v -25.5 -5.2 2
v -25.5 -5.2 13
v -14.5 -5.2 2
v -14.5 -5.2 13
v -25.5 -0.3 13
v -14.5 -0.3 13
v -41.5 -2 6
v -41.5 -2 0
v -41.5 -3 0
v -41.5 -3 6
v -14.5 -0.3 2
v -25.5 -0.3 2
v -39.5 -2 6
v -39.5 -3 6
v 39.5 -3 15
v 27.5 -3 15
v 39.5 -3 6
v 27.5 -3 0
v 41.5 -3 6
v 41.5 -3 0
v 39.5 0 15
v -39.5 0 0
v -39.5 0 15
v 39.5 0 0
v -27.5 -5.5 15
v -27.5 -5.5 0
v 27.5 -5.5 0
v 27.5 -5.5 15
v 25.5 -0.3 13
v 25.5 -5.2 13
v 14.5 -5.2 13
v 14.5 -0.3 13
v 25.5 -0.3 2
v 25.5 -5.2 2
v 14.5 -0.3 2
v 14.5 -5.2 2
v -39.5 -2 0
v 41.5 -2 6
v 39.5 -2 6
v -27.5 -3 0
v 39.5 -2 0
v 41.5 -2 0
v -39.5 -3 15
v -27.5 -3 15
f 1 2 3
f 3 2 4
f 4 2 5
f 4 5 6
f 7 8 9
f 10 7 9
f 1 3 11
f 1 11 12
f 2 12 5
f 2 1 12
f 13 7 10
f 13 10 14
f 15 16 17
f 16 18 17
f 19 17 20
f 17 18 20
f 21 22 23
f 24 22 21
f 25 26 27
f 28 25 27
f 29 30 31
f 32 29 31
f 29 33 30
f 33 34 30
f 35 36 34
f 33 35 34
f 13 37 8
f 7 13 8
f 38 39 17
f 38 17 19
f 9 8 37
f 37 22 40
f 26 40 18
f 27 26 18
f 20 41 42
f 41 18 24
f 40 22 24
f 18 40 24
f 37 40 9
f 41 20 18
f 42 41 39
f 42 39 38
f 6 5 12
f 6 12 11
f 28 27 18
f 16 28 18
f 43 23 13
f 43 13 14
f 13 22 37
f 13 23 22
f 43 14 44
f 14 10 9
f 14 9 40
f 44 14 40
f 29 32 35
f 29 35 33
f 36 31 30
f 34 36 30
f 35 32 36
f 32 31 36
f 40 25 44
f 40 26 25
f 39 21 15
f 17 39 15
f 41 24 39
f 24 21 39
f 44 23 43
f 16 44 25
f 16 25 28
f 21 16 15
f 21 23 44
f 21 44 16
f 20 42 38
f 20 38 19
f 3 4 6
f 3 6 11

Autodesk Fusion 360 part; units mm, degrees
sketch "Sketch1" plane through (0, 0, 0) normal (0, 0, 1) x (1, 0, 0) in component "Component'"
  line L0 (-39.5, 0) -> (39.5, 0)
  line L1 (-39.5, 0) -> (-39.5, -2)
  line L2 (-39.5, -2) -> (-41.5, -2)
  line L3 (-41.5, -2) -> (-41.5, -3)
  line L4 (0, 0) -> (0, -5.5) construction
  line L5 (39.5, 0) -> (39.5, -2)
  line L6 (39.5, -2) -> (41.5, -2)
  line L7 (41.5, -2) -> (41.5, -3)
  line L8 (-41.5, -3) -> (41.5, -3)
  line L9 (-27.5, -5.5) -> (27.5, -5.5)
  line L10 (27.5, -5.5) -> (27.5, -3)
  line L11 (-27.5, -5.5) -> (-27.5, -3)
  line L12 (-39.5, -2) -> (-39.5, -3)
  line L13 (39.5, -2) -> (39.5, -3)
  dimension "d19" = 79
  dimension "d20" = 2
  dimension "d21" = 2
  dimension "d22" = 1
  dimension "d23" = 5.5
  dimension "d24" = 55
extrude "Extrude1" add sketch "Sketch1" along normal blind 15 contours L0 L1 L5 L8 L12 L13 | L8 L9 L10 L11 in component "Component'"
extrude "Extrude2" add sketch "Sketch1" along normal blind 6 contours L2 L3 L8 L12 | L6 L7 L8 L13 in component "Component'"
sketch "Sketch2" plane through (0, -5.5, 0) normal (0, -1, 0) x (1, 0, 0) in component "Component'"
  line L0 (-27.5, 0) -> (27.5, 0)
  line L1 (27.5, 0) -> (27.5, 15)
  line L2 (27.5, 15) -> (-27.5, 15)
  line L3 (-27.5, 15) -> (-27.5, 0)
  line L4 (-25.5, 13) -> (-14.5, 13)
  line L5 (-14.5, 13) -> (-14.5, 2)
  line L6 (-14.5, 2) -> (-25.5, 2)
  line L7 (-25.5, 2) -> (-25.5, 13)
  line L8 (-27.5, 0) -> (27.5, 0)
  line L9 (0, 0) -> (0, 15) construction
  line L10 (25.5, 13) -> (14.5, 13)
  line L11 (25.5, 2) -> (25.5, 13)
  line L12 (14.5, 13) -> (14.5, 2)
  line L13 (14.5, 2) -> (25.5, 2)
  dimension "d29" = 11
  dimension "d30" = 11
  dimension "d31" = 2
  dimension "d32" = 2
extrude "Extrude3" cut sketch "Sketch2" against normal up to surface (5.5 mm away) contours L4 L5 L6 L7 | L10 L11 L12 L13 in component "Component'"
sketch "Sketch3" plane through (0, 0, 15) normal (0, 0, 1) x (-1, 0, 0) in component "Component'"
  line L0 (39.5, 0) -> (39.5, 3)
  line L1 (39.5, 3) -> (27.5, 3)
  line L2 (27.5, 3) -> (27.5, 5.5)
  line L3 (27.5, 5.5) -> (-27.5, 5.5)
  line L4 (-27.5, 5.5) -> (-27.5, 3)
  line L5 (-27.5, 3) -> (-39.5, 3)
  line L6 (-39.5, 3) -> (-39.5, 0)
  line L7 (-39.5, 0) -> (39.5, 0)
  line L8 (39.5, 0.3) -> (-39.5, 0.3)
  line L9 (27.5, 5.2) -> (-27.5, 5.2)
  line L10 (39.5, 0) -> (-39.5, 0)
  line L11 (27.5, 5.5) -> (-27.5, 5.5)
  dimension "d36" = 0.3
  dimension "d37" = 0.3
extrude "Extrude4" add sketch "Sketch3" against normal up to surface (15 mm away) contours L0 L6 L7 L8 L10 | L2 L3 L4 L9 L11 in component "Component'"
component "Component'" placed x (1, 0, 0) y (0, 1, 0) z (0, 0, 1) at (0, 0, 0)
